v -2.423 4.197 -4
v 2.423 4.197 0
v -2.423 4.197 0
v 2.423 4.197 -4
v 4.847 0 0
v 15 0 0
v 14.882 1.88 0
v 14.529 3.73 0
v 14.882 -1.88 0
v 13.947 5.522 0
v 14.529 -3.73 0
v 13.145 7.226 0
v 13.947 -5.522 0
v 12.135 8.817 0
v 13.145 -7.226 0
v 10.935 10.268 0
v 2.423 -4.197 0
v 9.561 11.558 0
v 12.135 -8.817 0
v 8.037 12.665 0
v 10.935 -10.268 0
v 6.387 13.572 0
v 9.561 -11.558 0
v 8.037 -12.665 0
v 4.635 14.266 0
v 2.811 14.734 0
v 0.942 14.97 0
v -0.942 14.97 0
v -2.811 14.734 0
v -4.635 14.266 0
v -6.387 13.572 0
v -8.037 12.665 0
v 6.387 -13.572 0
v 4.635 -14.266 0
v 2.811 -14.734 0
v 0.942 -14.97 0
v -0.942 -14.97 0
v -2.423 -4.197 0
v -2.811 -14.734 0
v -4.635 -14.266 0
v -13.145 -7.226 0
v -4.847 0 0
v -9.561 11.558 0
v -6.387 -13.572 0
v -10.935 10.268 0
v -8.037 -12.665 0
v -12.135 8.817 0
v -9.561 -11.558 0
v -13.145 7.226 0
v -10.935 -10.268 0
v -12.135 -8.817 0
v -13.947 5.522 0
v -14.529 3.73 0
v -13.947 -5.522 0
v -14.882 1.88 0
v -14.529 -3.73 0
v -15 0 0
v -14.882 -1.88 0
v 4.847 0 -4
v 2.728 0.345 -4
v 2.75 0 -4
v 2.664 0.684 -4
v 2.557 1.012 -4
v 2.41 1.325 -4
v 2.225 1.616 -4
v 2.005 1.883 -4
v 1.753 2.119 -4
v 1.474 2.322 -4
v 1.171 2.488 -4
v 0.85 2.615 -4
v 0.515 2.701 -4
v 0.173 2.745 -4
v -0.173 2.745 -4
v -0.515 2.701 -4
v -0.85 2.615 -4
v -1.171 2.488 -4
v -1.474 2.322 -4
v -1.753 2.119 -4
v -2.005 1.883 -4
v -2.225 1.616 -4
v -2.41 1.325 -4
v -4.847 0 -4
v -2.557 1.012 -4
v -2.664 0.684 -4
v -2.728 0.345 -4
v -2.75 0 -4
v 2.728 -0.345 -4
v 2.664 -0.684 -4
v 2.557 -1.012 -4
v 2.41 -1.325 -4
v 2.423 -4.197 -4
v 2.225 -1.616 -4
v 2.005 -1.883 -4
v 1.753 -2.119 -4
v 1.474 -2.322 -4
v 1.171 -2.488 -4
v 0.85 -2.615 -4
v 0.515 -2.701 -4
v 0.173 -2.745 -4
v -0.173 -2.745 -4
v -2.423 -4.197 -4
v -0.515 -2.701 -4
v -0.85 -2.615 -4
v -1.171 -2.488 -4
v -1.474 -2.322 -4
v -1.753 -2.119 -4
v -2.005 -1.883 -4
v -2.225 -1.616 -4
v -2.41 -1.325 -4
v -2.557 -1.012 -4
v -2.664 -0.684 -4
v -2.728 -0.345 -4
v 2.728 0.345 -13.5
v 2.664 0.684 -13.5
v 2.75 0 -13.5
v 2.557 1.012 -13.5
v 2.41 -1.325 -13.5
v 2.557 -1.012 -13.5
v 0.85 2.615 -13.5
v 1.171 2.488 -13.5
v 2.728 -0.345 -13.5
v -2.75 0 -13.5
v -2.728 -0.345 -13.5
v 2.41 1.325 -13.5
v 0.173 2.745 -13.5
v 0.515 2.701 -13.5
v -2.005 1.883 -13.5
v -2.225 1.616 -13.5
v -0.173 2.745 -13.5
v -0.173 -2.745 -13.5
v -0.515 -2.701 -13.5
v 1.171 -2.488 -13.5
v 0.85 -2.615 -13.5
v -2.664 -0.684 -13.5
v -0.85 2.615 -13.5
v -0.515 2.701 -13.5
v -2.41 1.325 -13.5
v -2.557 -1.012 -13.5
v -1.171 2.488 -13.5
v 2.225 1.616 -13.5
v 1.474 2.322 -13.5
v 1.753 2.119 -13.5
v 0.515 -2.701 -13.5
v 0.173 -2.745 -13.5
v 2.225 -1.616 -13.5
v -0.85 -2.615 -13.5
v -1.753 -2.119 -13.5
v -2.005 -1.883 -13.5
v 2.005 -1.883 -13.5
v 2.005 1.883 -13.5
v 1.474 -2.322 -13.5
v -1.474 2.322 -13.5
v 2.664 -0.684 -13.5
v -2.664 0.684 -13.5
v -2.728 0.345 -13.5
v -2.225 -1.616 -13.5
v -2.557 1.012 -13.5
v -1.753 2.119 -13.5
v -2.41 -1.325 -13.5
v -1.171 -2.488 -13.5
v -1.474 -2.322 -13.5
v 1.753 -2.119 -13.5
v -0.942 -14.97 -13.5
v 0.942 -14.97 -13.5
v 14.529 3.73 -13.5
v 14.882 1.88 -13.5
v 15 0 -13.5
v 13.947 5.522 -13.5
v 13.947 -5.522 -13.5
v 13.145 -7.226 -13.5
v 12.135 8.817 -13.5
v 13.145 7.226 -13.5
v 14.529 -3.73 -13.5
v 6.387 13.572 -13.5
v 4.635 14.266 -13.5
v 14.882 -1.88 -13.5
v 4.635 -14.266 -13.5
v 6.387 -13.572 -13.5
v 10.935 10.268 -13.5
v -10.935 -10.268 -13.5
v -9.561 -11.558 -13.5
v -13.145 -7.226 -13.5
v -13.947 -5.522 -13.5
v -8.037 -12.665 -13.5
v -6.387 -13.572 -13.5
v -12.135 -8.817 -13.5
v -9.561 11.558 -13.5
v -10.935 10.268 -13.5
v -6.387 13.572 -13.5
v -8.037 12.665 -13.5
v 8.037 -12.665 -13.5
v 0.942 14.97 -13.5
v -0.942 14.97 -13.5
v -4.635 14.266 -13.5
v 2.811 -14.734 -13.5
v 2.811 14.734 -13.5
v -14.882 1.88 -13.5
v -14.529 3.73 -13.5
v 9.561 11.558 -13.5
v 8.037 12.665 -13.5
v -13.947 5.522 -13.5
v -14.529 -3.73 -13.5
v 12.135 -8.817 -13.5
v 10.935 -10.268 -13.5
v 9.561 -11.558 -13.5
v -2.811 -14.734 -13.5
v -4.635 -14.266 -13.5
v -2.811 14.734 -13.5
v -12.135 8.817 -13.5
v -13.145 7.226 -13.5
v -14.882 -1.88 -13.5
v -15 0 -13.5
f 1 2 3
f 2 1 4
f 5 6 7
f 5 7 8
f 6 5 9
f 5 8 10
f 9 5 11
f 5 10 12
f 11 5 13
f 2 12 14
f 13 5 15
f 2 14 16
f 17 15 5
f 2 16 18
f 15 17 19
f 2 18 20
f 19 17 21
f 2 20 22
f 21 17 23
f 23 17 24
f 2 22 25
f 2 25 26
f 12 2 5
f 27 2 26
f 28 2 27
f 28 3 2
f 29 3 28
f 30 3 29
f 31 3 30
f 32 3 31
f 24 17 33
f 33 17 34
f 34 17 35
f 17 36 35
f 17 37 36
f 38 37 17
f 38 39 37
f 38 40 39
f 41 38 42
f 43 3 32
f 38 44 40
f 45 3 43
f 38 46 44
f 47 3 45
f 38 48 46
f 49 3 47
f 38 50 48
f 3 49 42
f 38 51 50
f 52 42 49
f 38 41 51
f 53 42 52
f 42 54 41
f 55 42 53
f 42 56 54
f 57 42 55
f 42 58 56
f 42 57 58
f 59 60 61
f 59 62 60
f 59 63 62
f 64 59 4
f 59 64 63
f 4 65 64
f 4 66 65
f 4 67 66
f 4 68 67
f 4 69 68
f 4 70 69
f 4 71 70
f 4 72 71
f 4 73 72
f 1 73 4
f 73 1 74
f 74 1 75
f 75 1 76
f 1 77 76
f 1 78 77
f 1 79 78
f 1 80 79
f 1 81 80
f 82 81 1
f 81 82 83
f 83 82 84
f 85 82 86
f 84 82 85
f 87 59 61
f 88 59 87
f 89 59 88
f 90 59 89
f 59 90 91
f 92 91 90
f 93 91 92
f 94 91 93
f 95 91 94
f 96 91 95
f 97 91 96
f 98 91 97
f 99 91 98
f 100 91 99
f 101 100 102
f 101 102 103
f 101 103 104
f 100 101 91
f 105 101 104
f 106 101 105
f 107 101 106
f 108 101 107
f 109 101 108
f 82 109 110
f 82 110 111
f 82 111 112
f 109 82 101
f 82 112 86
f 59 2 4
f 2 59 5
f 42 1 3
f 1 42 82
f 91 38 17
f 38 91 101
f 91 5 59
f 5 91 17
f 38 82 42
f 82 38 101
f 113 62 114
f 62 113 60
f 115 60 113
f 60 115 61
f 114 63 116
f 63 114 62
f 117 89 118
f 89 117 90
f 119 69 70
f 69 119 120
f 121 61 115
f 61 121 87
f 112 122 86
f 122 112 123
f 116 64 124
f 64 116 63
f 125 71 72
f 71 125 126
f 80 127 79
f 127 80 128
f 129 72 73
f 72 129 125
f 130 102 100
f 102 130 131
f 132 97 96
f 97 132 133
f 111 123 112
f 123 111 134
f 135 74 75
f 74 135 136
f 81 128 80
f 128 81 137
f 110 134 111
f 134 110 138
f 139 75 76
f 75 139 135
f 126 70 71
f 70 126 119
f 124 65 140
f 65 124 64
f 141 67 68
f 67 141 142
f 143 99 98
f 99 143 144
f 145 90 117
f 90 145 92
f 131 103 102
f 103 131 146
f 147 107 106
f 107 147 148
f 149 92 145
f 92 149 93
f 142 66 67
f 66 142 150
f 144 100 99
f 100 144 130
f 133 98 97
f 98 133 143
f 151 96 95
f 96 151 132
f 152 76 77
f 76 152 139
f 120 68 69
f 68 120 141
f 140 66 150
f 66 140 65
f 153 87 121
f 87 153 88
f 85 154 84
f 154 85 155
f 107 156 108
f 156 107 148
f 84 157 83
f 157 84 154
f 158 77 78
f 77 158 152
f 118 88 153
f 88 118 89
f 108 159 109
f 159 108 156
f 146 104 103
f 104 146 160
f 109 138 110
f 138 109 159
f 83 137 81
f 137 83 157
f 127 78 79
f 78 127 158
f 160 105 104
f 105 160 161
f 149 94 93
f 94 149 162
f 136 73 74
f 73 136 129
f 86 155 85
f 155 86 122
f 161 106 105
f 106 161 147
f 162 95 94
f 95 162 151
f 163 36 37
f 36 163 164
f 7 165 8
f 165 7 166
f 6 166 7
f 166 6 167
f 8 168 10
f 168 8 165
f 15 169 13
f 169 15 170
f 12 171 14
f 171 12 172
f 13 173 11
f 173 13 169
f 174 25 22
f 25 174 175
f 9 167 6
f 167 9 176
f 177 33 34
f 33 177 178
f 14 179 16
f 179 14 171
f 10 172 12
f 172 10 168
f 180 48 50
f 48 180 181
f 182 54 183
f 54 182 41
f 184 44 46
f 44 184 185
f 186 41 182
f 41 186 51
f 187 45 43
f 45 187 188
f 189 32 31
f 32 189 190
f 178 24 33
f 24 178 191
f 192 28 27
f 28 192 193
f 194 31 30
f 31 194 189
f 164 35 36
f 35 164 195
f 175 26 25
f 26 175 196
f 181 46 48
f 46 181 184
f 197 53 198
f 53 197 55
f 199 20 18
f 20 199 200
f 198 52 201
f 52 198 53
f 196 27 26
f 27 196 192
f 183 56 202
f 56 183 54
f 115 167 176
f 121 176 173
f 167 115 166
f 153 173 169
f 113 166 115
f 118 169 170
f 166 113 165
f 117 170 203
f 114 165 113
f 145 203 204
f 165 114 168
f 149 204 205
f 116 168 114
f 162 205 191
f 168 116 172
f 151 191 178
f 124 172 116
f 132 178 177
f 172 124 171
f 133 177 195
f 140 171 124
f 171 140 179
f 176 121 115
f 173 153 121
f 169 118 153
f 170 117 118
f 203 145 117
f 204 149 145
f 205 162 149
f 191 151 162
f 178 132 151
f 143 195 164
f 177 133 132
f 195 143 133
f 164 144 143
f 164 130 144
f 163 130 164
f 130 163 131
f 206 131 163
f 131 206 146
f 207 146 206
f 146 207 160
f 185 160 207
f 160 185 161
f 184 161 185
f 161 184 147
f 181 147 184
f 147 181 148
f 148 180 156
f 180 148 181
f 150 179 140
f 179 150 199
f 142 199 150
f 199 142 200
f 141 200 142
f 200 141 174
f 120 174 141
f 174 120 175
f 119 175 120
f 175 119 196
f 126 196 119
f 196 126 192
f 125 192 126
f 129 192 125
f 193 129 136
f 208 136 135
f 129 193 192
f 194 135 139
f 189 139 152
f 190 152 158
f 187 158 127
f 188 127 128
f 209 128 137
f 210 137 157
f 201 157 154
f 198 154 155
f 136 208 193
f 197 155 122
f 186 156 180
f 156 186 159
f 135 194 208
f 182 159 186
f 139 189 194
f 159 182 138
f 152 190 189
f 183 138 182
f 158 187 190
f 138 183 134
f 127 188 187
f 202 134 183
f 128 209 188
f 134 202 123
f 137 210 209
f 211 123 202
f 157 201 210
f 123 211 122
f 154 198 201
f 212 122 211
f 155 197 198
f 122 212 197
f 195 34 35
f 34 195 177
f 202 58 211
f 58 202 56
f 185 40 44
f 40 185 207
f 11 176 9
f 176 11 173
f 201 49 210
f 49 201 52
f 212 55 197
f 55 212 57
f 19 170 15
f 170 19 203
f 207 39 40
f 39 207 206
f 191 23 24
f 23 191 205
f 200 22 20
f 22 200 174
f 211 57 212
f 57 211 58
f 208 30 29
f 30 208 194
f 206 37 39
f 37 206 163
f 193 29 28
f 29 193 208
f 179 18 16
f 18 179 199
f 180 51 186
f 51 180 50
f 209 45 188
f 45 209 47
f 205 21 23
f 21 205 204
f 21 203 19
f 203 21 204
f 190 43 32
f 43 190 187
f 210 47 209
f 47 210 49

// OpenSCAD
$fn = 50;


difference() {
	union() {
		translate(v = [0, 0, -13.5000000000]) {
			cylinder(h = 13.5000000000, r = 15.0000000000);
		}
	}
	union() {
		translate(v = [0, 0, 0]) {
			rotate(a = [0, 0, 0]) {
				difference() {
					union() {
						translate(v = [0, 0, -4]) {
							linear_extrude(height = 4) {
								polygon(points = [[4.8468000000, 0.0000000000], [2.4234000000, 4.1974519271], [-2.4234000000, 4.1974519271], [-4.8468000000, 0.0000000000], [-2.4234000000, -4.1974519271], [2.4234000000, -4.1974519271]]);
							}
						}
					}
					union();
				}
			}
		}
		#translate(v = [0, 0, -100.0000000000]) {
			cylinder(h = 200, r = 2.7500000000);
		}
	}
}
